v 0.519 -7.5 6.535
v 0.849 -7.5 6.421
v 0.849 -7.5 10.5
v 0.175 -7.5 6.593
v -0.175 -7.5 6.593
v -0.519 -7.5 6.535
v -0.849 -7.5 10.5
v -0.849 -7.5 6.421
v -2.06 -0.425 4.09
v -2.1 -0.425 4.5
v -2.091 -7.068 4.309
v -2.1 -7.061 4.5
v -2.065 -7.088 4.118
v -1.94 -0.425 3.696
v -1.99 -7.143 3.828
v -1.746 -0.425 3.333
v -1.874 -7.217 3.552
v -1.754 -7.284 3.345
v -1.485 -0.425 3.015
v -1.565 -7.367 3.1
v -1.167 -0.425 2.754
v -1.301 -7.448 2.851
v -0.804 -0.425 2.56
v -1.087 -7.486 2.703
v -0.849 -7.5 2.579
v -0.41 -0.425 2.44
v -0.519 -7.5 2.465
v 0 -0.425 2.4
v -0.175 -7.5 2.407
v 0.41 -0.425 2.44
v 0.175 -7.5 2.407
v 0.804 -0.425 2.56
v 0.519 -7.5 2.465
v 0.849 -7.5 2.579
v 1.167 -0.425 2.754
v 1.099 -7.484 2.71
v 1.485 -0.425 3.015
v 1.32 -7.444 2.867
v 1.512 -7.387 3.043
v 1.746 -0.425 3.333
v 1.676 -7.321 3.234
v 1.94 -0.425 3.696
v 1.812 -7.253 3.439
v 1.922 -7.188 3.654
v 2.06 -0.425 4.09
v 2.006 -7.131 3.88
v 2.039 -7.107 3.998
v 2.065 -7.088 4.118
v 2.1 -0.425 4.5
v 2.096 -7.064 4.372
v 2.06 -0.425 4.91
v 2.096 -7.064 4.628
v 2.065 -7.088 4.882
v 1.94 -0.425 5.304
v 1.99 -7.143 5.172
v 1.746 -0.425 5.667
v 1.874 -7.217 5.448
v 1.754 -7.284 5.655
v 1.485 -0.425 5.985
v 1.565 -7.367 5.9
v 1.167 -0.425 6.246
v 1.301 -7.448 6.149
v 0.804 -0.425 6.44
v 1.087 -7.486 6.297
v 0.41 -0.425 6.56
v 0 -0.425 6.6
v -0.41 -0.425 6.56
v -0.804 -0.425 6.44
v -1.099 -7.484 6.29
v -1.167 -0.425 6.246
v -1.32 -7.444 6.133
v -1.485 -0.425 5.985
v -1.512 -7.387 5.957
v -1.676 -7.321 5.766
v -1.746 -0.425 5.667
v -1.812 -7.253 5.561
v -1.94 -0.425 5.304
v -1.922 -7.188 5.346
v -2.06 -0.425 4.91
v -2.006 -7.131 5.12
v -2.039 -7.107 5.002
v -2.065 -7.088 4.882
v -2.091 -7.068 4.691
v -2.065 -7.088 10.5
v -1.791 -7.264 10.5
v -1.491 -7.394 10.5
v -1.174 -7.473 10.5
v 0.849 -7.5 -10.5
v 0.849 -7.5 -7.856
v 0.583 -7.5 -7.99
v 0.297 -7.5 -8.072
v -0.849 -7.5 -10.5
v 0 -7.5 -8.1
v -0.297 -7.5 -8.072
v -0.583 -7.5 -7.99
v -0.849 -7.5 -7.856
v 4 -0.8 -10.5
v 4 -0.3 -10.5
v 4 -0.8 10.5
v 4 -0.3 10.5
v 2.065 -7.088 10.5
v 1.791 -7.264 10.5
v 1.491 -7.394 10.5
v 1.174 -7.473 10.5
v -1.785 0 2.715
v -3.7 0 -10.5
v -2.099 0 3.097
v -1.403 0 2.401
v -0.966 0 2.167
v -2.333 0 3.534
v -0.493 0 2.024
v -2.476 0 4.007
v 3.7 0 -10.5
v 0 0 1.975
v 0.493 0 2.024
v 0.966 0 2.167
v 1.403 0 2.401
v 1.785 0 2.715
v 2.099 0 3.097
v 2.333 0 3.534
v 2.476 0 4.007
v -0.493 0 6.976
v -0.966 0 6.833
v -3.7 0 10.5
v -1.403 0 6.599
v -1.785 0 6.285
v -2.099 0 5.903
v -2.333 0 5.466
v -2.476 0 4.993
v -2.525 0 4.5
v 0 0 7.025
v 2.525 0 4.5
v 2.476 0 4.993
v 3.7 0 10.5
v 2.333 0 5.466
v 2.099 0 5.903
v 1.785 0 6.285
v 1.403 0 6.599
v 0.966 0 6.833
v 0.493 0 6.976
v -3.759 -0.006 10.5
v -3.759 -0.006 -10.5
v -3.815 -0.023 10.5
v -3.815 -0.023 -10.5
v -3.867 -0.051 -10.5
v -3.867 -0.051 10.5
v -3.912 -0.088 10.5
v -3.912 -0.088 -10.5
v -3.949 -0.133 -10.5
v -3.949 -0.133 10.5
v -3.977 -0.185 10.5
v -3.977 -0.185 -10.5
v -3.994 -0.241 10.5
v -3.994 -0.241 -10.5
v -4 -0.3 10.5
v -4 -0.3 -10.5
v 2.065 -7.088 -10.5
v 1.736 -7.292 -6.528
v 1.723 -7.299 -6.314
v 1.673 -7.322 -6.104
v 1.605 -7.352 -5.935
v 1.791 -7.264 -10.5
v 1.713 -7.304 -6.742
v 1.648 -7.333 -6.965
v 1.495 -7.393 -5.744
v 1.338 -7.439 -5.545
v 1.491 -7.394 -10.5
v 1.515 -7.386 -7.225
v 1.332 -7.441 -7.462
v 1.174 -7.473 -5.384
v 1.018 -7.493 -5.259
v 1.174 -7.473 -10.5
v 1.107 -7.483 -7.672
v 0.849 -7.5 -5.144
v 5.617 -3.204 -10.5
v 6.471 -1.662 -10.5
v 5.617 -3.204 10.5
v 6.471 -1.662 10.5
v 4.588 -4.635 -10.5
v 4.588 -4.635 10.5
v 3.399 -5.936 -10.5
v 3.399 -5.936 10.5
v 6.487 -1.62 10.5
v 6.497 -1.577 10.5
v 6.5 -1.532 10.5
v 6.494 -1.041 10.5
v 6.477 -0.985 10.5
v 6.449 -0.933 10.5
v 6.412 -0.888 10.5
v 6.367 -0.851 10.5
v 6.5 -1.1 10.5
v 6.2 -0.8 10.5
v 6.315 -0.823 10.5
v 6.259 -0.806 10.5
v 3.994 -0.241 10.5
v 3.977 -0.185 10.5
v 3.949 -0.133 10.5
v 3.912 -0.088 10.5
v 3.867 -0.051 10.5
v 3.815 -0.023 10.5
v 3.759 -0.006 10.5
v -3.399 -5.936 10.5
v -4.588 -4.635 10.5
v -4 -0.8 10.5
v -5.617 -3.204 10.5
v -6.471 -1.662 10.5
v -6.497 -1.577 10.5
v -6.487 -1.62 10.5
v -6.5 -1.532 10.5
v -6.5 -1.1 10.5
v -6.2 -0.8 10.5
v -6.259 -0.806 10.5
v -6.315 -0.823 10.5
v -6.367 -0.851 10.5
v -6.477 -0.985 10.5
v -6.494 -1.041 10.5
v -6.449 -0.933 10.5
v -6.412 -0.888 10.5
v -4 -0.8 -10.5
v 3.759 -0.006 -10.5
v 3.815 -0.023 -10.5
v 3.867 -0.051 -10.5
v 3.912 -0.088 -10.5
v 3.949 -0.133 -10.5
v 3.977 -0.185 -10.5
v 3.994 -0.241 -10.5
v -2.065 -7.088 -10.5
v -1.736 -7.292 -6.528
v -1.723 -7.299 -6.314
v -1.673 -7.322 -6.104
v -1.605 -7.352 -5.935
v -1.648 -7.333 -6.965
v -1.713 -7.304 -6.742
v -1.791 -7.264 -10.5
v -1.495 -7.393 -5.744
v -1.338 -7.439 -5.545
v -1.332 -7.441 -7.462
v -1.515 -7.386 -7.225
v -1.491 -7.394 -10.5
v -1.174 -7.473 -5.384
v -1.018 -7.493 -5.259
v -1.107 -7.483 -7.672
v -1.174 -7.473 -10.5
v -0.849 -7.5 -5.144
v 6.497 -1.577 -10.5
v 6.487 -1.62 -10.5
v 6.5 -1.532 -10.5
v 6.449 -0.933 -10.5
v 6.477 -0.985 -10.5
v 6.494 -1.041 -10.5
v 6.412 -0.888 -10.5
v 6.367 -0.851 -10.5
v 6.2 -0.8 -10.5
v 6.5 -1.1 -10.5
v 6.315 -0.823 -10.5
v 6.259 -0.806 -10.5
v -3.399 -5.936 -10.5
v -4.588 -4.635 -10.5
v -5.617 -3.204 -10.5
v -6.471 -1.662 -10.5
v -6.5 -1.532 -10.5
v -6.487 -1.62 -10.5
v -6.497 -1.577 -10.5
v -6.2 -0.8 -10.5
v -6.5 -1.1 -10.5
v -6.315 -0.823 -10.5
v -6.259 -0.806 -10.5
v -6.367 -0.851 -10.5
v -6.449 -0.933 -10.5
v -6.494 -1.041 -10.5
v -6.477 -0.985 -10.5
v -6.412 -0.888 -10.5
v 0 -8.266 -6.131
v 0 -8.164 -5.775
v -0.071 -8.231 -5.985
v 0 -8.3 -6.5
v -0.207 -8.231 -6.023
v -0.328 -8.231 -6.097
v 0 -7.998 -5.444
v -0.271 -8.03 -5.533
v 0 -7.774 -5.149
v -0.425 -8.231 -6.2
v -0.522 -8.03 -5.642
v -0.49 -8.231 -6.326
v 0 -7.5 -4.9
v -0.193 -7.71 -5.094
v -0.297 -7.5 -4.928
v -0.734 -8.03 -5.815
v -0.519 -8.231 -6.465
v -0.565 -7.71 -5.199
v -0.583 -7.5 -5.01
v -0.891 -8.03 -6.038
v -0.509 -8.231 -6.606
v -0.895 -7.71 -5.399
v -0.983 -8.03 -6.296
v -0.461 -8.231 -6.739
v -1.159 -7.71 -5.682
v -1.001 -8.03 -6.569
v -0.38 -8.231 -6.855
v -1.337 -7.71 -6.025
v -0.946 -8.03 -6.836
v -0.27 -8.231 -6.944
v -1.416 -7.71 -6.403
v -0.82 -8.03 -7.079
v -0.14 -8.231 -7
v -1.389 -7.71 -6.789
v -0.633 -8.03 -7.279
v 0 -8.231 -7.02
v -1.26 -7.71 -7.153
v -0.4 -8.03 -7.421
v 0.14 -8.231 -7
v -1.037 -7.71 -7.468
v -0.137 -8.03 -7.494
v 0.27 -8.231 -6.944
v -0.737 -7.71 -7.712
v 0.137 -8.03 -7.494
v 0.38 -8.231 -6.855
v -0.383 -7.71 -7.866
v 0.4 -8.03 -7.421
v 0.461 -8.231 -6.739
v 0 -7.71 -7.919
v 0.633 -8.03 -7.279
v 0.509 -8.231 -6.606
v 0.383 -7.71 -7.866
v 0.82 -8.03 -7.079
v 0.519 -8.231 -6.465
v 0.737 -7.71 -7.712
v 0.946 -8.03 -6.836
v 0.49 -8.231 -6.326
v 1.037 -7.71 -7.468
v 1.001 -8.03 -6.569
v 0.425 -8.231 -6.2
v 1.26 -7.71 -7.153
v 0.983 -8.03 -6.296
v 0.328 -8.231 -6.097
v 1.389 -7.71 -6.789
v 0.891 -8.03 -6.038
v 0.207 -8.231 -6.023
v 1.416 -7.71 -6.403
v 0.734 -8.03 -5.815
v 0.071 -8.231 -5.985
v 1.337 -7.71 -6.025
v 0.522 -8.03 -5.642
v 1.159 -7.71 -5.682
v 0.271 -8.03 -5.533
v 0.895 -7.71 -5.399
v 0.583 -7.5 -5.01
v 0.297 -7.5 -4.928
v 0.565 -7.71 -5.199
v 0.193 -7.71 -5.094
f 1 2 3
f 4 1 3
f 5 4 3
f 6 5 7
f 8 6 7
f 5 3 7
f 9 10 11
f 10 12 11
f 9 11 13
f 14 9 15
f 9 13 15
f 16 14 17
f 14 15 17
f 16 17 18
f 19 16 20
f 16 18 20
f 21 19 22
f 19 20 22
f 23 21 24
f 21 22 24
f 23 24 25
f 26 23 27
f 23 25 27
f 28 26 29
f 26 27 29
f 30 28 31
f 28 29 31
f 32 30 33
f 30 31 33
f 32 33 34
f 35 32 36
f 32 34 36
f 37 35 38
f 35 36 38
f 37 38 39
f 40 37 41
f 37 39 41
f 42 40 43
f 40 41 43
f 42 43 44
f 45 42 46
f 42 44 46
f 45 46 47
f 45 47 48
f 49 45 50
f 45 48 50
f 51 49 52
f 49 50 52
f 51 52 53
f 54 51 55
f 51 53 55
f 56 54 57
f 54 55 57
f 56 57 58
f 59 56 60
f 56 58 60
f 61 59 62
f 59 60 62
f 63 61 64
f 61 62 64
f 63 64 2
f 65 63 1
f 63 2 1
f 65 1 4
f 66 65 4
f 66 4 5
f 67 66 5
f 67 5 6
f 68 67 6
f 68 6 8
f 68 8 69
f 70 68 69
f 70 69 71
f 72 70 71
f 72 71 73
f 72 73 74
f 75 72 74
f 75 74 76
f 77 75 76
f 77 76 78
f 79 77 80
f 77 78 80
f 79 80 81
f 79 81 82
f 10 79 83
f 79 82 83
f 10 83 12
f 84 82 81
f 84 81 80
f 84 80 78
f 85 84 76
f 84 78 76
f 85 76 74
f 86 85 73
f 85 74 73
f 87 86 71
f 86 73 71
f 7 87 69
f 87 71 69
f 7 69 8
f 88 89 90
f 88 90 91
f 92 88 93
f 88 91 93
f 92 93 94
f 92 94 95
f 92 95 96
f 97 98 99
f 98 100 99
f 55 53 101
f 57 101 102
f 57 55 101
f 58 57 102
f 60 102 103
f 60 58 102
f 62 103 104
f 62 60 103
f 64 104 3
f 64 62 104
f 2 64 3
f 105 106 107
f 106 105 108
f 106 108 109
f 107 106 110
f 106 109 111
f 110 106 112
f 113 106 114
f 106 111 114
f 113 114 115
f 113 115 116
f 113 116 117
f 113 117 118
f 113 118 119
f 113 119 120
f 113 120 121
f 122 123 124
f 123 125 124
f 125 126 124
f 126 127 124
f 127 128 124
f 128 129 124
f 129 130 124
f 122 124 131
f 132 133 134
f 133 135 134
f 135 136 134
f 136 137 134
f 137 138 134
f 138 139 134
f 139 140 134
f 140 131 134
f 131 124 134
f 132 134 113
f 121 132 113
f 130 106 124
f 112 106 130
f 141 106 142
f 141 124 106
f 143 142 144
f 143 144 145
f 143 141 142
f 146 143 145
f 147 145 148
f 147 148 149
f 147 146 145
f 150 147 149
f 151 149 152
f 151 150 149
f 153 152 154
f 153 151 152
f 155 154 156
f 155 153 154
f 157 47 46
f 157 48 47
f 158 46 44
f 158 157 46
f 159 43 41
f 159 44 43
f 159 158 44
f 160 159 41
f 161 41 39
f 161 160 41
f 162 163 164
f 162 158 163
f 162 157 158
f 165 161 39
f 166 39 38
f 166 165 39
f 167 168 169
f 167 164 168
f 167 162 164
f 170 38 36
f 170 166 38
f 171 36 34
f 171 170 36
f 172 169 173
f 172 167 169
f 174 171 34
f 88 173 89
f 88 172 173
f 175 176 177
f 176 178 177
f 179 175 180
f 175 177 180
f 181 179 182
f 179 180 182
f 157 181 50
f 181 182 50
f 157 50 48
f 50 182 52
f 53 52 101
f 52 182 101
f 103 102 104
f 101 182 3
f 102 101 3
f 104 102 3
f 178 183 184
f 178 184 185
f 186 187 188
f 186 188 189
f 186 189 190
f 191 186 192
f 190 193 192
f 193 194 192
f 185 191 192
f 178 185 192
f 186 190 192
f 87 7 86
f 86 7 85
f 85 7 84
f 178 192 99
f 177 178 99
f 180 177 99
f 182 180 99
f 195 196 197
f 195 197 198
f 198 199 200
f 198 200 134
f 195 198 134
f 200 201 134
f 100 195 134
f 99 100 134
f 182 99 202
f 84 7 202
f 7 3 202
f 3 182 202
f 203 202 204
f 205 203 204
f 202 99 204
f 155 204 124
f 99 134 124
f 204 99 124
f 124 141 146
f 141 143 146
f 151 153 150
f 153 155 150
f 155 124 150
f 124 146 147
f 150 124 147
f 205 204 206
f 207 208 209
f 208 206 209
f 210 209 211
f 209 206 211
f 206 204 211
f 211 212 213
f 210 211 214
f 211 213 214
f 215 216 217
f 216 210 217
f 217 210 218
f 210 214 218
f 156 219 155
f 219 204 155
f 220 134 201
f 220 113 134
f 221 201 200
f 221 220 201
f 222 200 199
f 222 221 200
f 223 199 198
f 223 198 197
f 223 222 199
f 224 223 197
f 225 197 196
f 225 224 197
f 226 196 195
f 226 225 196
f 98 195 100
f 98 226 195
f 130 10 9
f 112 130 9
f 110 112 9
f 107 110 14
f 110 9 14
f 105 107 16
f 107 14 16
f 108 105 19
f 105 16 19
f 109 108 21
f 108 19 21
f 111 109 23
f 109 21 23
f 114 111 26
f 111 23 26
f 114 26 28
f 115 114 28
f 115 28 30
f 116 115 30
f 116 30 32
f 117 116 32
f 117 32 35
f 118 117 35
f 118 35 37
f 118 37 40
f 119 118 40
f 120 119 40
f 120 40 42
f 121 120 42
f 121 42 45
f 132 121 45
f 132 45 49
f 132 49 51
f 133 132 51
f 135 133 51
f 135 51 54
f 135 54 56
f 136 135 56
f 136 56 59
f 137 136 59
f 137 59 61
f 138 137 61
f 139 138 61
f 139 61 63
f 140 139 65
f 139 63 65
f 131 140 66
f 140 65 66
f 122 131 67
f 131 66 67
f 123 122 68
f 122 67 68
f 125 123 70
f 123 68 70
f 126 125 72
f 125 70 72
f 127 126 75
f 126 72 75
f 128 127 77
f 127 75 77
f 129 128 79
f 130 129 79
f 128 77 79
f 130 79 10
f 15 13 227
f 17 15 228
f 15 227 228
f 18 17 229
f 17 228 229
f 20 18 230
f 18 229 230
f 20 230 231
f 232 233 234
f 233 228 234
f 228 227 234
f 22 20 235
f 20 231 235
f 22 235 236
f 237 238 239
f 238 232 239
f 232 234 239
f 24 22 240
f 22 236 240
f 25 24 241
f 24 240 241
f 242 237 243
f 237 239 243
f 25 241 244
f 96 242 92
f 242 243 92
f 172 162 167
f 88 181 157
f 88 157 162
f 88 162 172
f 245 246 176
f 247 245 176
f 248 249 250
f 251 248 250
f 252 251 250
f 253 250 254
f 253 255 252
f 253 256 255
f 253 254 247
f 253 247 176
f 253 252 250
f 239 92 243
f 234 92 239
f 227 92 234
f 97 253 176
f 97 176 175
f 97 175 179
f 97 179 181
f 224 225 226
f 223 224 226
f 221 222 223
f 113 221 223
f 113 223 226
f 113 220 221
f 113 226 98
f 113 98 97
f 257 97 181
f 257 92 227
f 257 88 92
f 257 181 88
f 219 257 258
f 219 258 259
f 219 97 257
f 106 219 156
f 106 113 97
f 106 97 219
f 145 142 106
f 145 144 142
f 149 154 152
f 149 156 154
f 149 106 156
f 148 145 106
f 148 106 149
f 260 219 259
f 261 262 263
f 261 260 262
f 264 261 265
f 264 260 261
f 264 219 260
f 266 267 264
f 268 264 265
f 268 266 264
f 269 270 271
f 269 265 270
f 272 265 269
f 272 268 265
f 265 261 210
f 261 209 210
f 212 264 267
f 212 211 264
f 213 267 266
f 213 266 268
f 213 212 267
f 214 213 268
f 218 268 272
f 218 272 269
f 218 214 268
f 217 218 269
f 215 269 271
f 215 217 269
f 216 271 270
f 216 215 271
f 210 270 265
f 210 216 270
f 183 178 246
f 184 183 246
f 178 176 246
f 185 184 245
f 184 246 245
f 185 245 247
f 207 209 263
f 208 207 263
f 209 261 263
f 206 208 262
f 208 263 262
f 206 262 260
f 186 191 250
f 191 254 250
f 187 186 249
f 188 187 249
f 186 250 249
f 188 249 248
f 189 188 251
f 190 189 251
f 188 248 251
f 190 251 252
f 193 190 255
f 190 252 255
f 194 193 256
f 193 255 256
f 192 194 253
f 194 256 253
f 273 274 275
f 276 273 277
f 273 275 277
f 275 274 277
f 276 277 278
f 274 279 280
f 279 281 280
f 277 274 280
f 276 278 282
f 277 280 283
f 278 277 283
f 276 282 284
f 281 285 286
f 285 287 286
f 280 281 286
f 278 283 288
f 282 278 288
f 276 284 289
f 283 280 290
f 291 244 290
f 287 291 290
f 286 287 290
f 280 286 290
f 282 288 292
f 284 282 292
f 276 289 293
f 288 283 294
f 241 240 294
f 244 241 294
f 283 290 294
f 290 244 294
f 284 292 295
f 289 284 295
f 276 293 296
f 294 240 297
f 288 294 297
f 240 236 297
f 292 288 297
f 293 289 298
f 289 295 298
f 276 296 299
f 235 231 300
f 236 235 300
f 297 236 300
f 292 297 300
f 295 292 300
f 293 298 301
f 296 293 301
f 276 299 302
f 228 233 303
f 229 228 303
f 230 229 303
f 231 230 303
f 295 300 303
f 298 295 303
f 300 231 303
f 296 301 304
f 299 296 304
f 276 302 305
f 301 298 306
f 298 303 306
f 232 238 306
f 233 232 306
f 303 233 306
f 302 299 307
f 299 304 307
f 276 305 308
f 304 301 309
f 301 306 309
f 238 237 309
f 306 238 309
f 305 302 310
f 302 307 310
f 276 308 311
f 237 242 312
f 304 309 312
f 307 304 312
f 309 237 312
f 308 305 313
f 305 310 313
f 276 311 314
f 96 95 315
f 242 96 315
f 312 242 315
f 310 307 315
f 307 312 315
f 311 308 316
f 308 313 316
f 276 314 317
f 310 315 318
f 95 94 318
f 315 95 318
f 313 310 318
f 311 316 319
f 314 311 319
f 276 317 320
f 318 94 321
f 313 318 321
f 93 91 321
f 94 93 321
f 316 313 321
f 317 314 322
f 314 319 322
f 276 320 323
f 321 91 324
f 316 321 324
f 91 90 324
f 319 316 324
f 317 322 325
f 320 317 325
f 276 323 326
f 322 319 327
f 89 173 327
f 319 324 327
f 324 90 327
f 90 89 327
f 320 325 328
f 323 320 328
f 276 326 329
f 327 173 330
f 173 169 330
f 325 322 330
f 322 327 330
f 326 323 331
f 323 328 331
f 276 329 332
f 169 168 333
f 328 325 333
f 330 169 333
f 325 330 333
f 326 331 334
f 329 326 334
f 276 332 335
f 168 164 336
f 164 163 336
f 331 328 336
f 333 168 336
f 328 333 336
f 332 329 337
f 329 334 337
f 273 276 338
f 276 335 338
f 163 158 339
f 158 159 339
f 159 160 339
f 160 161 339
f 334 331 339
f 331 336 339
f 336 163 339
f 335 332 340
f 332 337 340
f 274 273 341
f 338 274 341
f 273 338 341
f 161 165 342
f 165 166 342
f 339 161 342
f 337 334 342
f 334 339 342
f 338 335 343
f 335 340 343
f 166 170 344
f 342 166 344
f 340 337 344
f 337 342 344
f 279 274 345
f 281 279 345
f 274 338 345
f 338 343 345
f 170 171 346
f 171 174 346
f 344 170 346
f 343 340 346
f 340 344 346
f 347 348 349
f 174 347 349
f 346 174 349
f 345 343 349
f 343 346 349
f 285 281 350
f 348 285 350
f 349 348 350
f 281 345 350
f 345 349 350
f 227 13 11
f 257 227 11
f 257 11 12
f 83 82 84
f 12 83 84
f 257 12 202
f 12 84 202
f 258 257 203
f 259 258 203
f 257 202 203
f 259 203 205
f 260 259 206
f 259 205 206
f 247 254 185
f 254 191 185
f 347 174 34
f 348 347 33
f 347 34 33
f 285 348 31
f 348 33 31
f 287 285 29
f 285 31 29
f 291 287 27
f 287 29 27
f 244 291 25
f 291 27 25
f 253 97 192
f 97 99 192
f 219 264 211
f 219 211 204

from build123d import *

# Parameters (mm, degrees)
EXTRUDE_1_DEPTH             = 10.5
FILLET_1_R                  = 0.3
FILLET_2_R                  = 2
HOLE_WIZARD_M52_D           = 4.2
HOLE_WIZARD_M52_CSINK_D     = 5.05
HOLE_WIZARD_M52_CSINK_ANGLE = 90


with BuildPart() as part:
    # Эскиз1 → Бобышка-Вытянуть1 (new body, symmetric)
    with BuildSketch(Plane.XY):
        with BuildLine():
            Line((-4, 0), (4, 0))
            Line((4, 0), (4, -0.8))
            Line((4, -0.8), (6.5, -0.8))
            Line((6.5, -0.8), (6.5, -1.6))
            ThreePointArc((6.5, -1.6), (4.386776199, -4.87777644), (1.5, -7.5))
            Line((1.5, -7.5), (-1.5, -7.5))
            ThreePointArc((-1.5, -7.5), (-4.386776199, -4.87777644), (-6.5, -1.6))
            Line((-6.5, -1.6), (-6.5, -0.8))
            Line((-6.5, -0.8), (-4, -0.8))
            Line((-4, -0.8), (-4, 0))
        make_face()
    extrude(amount=EXTRUDE_1_DEPTH, both=True)

    # Скругление1
    fillet_1_edges = [part.edges().sort_by_distance(p)[0] for p in [
        (6.5, -0.8, 0),
        (6.5, -1.6, 0),
        (-6.5, -1.6, 0),
        (-6.5, -0.8, 0),
        (-4, 0, 0),
        (4, 0, 0),
    ]]
    fillet(fillet_1_edges, radius=FILLET_1_R)

    # Скругление2
    fillet_2_edges = [part.edges().sort_by_distance(p)[0] for p in [
        (1.5, -7.5, 0),
        (-1.5, -7.5, 0),
    ]]
    fillet(fillet_2_edges, radius=FILLET_2_R)

    # Отверстие обработанное метчиком M52 (through all)
    with Locations(Plane(origin=(0, 0, 0), x_dir=(1, 0, 0), z_dir=(0, 1, 0))):
        with Locations((0, -4.5)):
            CounterSinkHole(HOLE_WIZARD_M52_D / 2, HOLE_WIZARD_M52_CSINK_D / 2, counter_sink_angle=HOLE_WIZARD_M52_CSINK_ANGLE)

    # Эскиз5 → Повернуть1 (revolve)
    with BuildSketch(Plane(origin=(0, 0, 0), x_dir=(0, 0, -1), z_dir=(1, 0, 0))):
        with BuildLine():
            Line((6.5, -4.3), (6.5, -8.3))
            ThreePointArc((6.5, -8.3), (4.5, -6.3), (6.5, -4.3))
        make_face()
    revolve(axis=Axis((0, -4.3, -6.5), (0, -1, 0)))


solid = part.part
